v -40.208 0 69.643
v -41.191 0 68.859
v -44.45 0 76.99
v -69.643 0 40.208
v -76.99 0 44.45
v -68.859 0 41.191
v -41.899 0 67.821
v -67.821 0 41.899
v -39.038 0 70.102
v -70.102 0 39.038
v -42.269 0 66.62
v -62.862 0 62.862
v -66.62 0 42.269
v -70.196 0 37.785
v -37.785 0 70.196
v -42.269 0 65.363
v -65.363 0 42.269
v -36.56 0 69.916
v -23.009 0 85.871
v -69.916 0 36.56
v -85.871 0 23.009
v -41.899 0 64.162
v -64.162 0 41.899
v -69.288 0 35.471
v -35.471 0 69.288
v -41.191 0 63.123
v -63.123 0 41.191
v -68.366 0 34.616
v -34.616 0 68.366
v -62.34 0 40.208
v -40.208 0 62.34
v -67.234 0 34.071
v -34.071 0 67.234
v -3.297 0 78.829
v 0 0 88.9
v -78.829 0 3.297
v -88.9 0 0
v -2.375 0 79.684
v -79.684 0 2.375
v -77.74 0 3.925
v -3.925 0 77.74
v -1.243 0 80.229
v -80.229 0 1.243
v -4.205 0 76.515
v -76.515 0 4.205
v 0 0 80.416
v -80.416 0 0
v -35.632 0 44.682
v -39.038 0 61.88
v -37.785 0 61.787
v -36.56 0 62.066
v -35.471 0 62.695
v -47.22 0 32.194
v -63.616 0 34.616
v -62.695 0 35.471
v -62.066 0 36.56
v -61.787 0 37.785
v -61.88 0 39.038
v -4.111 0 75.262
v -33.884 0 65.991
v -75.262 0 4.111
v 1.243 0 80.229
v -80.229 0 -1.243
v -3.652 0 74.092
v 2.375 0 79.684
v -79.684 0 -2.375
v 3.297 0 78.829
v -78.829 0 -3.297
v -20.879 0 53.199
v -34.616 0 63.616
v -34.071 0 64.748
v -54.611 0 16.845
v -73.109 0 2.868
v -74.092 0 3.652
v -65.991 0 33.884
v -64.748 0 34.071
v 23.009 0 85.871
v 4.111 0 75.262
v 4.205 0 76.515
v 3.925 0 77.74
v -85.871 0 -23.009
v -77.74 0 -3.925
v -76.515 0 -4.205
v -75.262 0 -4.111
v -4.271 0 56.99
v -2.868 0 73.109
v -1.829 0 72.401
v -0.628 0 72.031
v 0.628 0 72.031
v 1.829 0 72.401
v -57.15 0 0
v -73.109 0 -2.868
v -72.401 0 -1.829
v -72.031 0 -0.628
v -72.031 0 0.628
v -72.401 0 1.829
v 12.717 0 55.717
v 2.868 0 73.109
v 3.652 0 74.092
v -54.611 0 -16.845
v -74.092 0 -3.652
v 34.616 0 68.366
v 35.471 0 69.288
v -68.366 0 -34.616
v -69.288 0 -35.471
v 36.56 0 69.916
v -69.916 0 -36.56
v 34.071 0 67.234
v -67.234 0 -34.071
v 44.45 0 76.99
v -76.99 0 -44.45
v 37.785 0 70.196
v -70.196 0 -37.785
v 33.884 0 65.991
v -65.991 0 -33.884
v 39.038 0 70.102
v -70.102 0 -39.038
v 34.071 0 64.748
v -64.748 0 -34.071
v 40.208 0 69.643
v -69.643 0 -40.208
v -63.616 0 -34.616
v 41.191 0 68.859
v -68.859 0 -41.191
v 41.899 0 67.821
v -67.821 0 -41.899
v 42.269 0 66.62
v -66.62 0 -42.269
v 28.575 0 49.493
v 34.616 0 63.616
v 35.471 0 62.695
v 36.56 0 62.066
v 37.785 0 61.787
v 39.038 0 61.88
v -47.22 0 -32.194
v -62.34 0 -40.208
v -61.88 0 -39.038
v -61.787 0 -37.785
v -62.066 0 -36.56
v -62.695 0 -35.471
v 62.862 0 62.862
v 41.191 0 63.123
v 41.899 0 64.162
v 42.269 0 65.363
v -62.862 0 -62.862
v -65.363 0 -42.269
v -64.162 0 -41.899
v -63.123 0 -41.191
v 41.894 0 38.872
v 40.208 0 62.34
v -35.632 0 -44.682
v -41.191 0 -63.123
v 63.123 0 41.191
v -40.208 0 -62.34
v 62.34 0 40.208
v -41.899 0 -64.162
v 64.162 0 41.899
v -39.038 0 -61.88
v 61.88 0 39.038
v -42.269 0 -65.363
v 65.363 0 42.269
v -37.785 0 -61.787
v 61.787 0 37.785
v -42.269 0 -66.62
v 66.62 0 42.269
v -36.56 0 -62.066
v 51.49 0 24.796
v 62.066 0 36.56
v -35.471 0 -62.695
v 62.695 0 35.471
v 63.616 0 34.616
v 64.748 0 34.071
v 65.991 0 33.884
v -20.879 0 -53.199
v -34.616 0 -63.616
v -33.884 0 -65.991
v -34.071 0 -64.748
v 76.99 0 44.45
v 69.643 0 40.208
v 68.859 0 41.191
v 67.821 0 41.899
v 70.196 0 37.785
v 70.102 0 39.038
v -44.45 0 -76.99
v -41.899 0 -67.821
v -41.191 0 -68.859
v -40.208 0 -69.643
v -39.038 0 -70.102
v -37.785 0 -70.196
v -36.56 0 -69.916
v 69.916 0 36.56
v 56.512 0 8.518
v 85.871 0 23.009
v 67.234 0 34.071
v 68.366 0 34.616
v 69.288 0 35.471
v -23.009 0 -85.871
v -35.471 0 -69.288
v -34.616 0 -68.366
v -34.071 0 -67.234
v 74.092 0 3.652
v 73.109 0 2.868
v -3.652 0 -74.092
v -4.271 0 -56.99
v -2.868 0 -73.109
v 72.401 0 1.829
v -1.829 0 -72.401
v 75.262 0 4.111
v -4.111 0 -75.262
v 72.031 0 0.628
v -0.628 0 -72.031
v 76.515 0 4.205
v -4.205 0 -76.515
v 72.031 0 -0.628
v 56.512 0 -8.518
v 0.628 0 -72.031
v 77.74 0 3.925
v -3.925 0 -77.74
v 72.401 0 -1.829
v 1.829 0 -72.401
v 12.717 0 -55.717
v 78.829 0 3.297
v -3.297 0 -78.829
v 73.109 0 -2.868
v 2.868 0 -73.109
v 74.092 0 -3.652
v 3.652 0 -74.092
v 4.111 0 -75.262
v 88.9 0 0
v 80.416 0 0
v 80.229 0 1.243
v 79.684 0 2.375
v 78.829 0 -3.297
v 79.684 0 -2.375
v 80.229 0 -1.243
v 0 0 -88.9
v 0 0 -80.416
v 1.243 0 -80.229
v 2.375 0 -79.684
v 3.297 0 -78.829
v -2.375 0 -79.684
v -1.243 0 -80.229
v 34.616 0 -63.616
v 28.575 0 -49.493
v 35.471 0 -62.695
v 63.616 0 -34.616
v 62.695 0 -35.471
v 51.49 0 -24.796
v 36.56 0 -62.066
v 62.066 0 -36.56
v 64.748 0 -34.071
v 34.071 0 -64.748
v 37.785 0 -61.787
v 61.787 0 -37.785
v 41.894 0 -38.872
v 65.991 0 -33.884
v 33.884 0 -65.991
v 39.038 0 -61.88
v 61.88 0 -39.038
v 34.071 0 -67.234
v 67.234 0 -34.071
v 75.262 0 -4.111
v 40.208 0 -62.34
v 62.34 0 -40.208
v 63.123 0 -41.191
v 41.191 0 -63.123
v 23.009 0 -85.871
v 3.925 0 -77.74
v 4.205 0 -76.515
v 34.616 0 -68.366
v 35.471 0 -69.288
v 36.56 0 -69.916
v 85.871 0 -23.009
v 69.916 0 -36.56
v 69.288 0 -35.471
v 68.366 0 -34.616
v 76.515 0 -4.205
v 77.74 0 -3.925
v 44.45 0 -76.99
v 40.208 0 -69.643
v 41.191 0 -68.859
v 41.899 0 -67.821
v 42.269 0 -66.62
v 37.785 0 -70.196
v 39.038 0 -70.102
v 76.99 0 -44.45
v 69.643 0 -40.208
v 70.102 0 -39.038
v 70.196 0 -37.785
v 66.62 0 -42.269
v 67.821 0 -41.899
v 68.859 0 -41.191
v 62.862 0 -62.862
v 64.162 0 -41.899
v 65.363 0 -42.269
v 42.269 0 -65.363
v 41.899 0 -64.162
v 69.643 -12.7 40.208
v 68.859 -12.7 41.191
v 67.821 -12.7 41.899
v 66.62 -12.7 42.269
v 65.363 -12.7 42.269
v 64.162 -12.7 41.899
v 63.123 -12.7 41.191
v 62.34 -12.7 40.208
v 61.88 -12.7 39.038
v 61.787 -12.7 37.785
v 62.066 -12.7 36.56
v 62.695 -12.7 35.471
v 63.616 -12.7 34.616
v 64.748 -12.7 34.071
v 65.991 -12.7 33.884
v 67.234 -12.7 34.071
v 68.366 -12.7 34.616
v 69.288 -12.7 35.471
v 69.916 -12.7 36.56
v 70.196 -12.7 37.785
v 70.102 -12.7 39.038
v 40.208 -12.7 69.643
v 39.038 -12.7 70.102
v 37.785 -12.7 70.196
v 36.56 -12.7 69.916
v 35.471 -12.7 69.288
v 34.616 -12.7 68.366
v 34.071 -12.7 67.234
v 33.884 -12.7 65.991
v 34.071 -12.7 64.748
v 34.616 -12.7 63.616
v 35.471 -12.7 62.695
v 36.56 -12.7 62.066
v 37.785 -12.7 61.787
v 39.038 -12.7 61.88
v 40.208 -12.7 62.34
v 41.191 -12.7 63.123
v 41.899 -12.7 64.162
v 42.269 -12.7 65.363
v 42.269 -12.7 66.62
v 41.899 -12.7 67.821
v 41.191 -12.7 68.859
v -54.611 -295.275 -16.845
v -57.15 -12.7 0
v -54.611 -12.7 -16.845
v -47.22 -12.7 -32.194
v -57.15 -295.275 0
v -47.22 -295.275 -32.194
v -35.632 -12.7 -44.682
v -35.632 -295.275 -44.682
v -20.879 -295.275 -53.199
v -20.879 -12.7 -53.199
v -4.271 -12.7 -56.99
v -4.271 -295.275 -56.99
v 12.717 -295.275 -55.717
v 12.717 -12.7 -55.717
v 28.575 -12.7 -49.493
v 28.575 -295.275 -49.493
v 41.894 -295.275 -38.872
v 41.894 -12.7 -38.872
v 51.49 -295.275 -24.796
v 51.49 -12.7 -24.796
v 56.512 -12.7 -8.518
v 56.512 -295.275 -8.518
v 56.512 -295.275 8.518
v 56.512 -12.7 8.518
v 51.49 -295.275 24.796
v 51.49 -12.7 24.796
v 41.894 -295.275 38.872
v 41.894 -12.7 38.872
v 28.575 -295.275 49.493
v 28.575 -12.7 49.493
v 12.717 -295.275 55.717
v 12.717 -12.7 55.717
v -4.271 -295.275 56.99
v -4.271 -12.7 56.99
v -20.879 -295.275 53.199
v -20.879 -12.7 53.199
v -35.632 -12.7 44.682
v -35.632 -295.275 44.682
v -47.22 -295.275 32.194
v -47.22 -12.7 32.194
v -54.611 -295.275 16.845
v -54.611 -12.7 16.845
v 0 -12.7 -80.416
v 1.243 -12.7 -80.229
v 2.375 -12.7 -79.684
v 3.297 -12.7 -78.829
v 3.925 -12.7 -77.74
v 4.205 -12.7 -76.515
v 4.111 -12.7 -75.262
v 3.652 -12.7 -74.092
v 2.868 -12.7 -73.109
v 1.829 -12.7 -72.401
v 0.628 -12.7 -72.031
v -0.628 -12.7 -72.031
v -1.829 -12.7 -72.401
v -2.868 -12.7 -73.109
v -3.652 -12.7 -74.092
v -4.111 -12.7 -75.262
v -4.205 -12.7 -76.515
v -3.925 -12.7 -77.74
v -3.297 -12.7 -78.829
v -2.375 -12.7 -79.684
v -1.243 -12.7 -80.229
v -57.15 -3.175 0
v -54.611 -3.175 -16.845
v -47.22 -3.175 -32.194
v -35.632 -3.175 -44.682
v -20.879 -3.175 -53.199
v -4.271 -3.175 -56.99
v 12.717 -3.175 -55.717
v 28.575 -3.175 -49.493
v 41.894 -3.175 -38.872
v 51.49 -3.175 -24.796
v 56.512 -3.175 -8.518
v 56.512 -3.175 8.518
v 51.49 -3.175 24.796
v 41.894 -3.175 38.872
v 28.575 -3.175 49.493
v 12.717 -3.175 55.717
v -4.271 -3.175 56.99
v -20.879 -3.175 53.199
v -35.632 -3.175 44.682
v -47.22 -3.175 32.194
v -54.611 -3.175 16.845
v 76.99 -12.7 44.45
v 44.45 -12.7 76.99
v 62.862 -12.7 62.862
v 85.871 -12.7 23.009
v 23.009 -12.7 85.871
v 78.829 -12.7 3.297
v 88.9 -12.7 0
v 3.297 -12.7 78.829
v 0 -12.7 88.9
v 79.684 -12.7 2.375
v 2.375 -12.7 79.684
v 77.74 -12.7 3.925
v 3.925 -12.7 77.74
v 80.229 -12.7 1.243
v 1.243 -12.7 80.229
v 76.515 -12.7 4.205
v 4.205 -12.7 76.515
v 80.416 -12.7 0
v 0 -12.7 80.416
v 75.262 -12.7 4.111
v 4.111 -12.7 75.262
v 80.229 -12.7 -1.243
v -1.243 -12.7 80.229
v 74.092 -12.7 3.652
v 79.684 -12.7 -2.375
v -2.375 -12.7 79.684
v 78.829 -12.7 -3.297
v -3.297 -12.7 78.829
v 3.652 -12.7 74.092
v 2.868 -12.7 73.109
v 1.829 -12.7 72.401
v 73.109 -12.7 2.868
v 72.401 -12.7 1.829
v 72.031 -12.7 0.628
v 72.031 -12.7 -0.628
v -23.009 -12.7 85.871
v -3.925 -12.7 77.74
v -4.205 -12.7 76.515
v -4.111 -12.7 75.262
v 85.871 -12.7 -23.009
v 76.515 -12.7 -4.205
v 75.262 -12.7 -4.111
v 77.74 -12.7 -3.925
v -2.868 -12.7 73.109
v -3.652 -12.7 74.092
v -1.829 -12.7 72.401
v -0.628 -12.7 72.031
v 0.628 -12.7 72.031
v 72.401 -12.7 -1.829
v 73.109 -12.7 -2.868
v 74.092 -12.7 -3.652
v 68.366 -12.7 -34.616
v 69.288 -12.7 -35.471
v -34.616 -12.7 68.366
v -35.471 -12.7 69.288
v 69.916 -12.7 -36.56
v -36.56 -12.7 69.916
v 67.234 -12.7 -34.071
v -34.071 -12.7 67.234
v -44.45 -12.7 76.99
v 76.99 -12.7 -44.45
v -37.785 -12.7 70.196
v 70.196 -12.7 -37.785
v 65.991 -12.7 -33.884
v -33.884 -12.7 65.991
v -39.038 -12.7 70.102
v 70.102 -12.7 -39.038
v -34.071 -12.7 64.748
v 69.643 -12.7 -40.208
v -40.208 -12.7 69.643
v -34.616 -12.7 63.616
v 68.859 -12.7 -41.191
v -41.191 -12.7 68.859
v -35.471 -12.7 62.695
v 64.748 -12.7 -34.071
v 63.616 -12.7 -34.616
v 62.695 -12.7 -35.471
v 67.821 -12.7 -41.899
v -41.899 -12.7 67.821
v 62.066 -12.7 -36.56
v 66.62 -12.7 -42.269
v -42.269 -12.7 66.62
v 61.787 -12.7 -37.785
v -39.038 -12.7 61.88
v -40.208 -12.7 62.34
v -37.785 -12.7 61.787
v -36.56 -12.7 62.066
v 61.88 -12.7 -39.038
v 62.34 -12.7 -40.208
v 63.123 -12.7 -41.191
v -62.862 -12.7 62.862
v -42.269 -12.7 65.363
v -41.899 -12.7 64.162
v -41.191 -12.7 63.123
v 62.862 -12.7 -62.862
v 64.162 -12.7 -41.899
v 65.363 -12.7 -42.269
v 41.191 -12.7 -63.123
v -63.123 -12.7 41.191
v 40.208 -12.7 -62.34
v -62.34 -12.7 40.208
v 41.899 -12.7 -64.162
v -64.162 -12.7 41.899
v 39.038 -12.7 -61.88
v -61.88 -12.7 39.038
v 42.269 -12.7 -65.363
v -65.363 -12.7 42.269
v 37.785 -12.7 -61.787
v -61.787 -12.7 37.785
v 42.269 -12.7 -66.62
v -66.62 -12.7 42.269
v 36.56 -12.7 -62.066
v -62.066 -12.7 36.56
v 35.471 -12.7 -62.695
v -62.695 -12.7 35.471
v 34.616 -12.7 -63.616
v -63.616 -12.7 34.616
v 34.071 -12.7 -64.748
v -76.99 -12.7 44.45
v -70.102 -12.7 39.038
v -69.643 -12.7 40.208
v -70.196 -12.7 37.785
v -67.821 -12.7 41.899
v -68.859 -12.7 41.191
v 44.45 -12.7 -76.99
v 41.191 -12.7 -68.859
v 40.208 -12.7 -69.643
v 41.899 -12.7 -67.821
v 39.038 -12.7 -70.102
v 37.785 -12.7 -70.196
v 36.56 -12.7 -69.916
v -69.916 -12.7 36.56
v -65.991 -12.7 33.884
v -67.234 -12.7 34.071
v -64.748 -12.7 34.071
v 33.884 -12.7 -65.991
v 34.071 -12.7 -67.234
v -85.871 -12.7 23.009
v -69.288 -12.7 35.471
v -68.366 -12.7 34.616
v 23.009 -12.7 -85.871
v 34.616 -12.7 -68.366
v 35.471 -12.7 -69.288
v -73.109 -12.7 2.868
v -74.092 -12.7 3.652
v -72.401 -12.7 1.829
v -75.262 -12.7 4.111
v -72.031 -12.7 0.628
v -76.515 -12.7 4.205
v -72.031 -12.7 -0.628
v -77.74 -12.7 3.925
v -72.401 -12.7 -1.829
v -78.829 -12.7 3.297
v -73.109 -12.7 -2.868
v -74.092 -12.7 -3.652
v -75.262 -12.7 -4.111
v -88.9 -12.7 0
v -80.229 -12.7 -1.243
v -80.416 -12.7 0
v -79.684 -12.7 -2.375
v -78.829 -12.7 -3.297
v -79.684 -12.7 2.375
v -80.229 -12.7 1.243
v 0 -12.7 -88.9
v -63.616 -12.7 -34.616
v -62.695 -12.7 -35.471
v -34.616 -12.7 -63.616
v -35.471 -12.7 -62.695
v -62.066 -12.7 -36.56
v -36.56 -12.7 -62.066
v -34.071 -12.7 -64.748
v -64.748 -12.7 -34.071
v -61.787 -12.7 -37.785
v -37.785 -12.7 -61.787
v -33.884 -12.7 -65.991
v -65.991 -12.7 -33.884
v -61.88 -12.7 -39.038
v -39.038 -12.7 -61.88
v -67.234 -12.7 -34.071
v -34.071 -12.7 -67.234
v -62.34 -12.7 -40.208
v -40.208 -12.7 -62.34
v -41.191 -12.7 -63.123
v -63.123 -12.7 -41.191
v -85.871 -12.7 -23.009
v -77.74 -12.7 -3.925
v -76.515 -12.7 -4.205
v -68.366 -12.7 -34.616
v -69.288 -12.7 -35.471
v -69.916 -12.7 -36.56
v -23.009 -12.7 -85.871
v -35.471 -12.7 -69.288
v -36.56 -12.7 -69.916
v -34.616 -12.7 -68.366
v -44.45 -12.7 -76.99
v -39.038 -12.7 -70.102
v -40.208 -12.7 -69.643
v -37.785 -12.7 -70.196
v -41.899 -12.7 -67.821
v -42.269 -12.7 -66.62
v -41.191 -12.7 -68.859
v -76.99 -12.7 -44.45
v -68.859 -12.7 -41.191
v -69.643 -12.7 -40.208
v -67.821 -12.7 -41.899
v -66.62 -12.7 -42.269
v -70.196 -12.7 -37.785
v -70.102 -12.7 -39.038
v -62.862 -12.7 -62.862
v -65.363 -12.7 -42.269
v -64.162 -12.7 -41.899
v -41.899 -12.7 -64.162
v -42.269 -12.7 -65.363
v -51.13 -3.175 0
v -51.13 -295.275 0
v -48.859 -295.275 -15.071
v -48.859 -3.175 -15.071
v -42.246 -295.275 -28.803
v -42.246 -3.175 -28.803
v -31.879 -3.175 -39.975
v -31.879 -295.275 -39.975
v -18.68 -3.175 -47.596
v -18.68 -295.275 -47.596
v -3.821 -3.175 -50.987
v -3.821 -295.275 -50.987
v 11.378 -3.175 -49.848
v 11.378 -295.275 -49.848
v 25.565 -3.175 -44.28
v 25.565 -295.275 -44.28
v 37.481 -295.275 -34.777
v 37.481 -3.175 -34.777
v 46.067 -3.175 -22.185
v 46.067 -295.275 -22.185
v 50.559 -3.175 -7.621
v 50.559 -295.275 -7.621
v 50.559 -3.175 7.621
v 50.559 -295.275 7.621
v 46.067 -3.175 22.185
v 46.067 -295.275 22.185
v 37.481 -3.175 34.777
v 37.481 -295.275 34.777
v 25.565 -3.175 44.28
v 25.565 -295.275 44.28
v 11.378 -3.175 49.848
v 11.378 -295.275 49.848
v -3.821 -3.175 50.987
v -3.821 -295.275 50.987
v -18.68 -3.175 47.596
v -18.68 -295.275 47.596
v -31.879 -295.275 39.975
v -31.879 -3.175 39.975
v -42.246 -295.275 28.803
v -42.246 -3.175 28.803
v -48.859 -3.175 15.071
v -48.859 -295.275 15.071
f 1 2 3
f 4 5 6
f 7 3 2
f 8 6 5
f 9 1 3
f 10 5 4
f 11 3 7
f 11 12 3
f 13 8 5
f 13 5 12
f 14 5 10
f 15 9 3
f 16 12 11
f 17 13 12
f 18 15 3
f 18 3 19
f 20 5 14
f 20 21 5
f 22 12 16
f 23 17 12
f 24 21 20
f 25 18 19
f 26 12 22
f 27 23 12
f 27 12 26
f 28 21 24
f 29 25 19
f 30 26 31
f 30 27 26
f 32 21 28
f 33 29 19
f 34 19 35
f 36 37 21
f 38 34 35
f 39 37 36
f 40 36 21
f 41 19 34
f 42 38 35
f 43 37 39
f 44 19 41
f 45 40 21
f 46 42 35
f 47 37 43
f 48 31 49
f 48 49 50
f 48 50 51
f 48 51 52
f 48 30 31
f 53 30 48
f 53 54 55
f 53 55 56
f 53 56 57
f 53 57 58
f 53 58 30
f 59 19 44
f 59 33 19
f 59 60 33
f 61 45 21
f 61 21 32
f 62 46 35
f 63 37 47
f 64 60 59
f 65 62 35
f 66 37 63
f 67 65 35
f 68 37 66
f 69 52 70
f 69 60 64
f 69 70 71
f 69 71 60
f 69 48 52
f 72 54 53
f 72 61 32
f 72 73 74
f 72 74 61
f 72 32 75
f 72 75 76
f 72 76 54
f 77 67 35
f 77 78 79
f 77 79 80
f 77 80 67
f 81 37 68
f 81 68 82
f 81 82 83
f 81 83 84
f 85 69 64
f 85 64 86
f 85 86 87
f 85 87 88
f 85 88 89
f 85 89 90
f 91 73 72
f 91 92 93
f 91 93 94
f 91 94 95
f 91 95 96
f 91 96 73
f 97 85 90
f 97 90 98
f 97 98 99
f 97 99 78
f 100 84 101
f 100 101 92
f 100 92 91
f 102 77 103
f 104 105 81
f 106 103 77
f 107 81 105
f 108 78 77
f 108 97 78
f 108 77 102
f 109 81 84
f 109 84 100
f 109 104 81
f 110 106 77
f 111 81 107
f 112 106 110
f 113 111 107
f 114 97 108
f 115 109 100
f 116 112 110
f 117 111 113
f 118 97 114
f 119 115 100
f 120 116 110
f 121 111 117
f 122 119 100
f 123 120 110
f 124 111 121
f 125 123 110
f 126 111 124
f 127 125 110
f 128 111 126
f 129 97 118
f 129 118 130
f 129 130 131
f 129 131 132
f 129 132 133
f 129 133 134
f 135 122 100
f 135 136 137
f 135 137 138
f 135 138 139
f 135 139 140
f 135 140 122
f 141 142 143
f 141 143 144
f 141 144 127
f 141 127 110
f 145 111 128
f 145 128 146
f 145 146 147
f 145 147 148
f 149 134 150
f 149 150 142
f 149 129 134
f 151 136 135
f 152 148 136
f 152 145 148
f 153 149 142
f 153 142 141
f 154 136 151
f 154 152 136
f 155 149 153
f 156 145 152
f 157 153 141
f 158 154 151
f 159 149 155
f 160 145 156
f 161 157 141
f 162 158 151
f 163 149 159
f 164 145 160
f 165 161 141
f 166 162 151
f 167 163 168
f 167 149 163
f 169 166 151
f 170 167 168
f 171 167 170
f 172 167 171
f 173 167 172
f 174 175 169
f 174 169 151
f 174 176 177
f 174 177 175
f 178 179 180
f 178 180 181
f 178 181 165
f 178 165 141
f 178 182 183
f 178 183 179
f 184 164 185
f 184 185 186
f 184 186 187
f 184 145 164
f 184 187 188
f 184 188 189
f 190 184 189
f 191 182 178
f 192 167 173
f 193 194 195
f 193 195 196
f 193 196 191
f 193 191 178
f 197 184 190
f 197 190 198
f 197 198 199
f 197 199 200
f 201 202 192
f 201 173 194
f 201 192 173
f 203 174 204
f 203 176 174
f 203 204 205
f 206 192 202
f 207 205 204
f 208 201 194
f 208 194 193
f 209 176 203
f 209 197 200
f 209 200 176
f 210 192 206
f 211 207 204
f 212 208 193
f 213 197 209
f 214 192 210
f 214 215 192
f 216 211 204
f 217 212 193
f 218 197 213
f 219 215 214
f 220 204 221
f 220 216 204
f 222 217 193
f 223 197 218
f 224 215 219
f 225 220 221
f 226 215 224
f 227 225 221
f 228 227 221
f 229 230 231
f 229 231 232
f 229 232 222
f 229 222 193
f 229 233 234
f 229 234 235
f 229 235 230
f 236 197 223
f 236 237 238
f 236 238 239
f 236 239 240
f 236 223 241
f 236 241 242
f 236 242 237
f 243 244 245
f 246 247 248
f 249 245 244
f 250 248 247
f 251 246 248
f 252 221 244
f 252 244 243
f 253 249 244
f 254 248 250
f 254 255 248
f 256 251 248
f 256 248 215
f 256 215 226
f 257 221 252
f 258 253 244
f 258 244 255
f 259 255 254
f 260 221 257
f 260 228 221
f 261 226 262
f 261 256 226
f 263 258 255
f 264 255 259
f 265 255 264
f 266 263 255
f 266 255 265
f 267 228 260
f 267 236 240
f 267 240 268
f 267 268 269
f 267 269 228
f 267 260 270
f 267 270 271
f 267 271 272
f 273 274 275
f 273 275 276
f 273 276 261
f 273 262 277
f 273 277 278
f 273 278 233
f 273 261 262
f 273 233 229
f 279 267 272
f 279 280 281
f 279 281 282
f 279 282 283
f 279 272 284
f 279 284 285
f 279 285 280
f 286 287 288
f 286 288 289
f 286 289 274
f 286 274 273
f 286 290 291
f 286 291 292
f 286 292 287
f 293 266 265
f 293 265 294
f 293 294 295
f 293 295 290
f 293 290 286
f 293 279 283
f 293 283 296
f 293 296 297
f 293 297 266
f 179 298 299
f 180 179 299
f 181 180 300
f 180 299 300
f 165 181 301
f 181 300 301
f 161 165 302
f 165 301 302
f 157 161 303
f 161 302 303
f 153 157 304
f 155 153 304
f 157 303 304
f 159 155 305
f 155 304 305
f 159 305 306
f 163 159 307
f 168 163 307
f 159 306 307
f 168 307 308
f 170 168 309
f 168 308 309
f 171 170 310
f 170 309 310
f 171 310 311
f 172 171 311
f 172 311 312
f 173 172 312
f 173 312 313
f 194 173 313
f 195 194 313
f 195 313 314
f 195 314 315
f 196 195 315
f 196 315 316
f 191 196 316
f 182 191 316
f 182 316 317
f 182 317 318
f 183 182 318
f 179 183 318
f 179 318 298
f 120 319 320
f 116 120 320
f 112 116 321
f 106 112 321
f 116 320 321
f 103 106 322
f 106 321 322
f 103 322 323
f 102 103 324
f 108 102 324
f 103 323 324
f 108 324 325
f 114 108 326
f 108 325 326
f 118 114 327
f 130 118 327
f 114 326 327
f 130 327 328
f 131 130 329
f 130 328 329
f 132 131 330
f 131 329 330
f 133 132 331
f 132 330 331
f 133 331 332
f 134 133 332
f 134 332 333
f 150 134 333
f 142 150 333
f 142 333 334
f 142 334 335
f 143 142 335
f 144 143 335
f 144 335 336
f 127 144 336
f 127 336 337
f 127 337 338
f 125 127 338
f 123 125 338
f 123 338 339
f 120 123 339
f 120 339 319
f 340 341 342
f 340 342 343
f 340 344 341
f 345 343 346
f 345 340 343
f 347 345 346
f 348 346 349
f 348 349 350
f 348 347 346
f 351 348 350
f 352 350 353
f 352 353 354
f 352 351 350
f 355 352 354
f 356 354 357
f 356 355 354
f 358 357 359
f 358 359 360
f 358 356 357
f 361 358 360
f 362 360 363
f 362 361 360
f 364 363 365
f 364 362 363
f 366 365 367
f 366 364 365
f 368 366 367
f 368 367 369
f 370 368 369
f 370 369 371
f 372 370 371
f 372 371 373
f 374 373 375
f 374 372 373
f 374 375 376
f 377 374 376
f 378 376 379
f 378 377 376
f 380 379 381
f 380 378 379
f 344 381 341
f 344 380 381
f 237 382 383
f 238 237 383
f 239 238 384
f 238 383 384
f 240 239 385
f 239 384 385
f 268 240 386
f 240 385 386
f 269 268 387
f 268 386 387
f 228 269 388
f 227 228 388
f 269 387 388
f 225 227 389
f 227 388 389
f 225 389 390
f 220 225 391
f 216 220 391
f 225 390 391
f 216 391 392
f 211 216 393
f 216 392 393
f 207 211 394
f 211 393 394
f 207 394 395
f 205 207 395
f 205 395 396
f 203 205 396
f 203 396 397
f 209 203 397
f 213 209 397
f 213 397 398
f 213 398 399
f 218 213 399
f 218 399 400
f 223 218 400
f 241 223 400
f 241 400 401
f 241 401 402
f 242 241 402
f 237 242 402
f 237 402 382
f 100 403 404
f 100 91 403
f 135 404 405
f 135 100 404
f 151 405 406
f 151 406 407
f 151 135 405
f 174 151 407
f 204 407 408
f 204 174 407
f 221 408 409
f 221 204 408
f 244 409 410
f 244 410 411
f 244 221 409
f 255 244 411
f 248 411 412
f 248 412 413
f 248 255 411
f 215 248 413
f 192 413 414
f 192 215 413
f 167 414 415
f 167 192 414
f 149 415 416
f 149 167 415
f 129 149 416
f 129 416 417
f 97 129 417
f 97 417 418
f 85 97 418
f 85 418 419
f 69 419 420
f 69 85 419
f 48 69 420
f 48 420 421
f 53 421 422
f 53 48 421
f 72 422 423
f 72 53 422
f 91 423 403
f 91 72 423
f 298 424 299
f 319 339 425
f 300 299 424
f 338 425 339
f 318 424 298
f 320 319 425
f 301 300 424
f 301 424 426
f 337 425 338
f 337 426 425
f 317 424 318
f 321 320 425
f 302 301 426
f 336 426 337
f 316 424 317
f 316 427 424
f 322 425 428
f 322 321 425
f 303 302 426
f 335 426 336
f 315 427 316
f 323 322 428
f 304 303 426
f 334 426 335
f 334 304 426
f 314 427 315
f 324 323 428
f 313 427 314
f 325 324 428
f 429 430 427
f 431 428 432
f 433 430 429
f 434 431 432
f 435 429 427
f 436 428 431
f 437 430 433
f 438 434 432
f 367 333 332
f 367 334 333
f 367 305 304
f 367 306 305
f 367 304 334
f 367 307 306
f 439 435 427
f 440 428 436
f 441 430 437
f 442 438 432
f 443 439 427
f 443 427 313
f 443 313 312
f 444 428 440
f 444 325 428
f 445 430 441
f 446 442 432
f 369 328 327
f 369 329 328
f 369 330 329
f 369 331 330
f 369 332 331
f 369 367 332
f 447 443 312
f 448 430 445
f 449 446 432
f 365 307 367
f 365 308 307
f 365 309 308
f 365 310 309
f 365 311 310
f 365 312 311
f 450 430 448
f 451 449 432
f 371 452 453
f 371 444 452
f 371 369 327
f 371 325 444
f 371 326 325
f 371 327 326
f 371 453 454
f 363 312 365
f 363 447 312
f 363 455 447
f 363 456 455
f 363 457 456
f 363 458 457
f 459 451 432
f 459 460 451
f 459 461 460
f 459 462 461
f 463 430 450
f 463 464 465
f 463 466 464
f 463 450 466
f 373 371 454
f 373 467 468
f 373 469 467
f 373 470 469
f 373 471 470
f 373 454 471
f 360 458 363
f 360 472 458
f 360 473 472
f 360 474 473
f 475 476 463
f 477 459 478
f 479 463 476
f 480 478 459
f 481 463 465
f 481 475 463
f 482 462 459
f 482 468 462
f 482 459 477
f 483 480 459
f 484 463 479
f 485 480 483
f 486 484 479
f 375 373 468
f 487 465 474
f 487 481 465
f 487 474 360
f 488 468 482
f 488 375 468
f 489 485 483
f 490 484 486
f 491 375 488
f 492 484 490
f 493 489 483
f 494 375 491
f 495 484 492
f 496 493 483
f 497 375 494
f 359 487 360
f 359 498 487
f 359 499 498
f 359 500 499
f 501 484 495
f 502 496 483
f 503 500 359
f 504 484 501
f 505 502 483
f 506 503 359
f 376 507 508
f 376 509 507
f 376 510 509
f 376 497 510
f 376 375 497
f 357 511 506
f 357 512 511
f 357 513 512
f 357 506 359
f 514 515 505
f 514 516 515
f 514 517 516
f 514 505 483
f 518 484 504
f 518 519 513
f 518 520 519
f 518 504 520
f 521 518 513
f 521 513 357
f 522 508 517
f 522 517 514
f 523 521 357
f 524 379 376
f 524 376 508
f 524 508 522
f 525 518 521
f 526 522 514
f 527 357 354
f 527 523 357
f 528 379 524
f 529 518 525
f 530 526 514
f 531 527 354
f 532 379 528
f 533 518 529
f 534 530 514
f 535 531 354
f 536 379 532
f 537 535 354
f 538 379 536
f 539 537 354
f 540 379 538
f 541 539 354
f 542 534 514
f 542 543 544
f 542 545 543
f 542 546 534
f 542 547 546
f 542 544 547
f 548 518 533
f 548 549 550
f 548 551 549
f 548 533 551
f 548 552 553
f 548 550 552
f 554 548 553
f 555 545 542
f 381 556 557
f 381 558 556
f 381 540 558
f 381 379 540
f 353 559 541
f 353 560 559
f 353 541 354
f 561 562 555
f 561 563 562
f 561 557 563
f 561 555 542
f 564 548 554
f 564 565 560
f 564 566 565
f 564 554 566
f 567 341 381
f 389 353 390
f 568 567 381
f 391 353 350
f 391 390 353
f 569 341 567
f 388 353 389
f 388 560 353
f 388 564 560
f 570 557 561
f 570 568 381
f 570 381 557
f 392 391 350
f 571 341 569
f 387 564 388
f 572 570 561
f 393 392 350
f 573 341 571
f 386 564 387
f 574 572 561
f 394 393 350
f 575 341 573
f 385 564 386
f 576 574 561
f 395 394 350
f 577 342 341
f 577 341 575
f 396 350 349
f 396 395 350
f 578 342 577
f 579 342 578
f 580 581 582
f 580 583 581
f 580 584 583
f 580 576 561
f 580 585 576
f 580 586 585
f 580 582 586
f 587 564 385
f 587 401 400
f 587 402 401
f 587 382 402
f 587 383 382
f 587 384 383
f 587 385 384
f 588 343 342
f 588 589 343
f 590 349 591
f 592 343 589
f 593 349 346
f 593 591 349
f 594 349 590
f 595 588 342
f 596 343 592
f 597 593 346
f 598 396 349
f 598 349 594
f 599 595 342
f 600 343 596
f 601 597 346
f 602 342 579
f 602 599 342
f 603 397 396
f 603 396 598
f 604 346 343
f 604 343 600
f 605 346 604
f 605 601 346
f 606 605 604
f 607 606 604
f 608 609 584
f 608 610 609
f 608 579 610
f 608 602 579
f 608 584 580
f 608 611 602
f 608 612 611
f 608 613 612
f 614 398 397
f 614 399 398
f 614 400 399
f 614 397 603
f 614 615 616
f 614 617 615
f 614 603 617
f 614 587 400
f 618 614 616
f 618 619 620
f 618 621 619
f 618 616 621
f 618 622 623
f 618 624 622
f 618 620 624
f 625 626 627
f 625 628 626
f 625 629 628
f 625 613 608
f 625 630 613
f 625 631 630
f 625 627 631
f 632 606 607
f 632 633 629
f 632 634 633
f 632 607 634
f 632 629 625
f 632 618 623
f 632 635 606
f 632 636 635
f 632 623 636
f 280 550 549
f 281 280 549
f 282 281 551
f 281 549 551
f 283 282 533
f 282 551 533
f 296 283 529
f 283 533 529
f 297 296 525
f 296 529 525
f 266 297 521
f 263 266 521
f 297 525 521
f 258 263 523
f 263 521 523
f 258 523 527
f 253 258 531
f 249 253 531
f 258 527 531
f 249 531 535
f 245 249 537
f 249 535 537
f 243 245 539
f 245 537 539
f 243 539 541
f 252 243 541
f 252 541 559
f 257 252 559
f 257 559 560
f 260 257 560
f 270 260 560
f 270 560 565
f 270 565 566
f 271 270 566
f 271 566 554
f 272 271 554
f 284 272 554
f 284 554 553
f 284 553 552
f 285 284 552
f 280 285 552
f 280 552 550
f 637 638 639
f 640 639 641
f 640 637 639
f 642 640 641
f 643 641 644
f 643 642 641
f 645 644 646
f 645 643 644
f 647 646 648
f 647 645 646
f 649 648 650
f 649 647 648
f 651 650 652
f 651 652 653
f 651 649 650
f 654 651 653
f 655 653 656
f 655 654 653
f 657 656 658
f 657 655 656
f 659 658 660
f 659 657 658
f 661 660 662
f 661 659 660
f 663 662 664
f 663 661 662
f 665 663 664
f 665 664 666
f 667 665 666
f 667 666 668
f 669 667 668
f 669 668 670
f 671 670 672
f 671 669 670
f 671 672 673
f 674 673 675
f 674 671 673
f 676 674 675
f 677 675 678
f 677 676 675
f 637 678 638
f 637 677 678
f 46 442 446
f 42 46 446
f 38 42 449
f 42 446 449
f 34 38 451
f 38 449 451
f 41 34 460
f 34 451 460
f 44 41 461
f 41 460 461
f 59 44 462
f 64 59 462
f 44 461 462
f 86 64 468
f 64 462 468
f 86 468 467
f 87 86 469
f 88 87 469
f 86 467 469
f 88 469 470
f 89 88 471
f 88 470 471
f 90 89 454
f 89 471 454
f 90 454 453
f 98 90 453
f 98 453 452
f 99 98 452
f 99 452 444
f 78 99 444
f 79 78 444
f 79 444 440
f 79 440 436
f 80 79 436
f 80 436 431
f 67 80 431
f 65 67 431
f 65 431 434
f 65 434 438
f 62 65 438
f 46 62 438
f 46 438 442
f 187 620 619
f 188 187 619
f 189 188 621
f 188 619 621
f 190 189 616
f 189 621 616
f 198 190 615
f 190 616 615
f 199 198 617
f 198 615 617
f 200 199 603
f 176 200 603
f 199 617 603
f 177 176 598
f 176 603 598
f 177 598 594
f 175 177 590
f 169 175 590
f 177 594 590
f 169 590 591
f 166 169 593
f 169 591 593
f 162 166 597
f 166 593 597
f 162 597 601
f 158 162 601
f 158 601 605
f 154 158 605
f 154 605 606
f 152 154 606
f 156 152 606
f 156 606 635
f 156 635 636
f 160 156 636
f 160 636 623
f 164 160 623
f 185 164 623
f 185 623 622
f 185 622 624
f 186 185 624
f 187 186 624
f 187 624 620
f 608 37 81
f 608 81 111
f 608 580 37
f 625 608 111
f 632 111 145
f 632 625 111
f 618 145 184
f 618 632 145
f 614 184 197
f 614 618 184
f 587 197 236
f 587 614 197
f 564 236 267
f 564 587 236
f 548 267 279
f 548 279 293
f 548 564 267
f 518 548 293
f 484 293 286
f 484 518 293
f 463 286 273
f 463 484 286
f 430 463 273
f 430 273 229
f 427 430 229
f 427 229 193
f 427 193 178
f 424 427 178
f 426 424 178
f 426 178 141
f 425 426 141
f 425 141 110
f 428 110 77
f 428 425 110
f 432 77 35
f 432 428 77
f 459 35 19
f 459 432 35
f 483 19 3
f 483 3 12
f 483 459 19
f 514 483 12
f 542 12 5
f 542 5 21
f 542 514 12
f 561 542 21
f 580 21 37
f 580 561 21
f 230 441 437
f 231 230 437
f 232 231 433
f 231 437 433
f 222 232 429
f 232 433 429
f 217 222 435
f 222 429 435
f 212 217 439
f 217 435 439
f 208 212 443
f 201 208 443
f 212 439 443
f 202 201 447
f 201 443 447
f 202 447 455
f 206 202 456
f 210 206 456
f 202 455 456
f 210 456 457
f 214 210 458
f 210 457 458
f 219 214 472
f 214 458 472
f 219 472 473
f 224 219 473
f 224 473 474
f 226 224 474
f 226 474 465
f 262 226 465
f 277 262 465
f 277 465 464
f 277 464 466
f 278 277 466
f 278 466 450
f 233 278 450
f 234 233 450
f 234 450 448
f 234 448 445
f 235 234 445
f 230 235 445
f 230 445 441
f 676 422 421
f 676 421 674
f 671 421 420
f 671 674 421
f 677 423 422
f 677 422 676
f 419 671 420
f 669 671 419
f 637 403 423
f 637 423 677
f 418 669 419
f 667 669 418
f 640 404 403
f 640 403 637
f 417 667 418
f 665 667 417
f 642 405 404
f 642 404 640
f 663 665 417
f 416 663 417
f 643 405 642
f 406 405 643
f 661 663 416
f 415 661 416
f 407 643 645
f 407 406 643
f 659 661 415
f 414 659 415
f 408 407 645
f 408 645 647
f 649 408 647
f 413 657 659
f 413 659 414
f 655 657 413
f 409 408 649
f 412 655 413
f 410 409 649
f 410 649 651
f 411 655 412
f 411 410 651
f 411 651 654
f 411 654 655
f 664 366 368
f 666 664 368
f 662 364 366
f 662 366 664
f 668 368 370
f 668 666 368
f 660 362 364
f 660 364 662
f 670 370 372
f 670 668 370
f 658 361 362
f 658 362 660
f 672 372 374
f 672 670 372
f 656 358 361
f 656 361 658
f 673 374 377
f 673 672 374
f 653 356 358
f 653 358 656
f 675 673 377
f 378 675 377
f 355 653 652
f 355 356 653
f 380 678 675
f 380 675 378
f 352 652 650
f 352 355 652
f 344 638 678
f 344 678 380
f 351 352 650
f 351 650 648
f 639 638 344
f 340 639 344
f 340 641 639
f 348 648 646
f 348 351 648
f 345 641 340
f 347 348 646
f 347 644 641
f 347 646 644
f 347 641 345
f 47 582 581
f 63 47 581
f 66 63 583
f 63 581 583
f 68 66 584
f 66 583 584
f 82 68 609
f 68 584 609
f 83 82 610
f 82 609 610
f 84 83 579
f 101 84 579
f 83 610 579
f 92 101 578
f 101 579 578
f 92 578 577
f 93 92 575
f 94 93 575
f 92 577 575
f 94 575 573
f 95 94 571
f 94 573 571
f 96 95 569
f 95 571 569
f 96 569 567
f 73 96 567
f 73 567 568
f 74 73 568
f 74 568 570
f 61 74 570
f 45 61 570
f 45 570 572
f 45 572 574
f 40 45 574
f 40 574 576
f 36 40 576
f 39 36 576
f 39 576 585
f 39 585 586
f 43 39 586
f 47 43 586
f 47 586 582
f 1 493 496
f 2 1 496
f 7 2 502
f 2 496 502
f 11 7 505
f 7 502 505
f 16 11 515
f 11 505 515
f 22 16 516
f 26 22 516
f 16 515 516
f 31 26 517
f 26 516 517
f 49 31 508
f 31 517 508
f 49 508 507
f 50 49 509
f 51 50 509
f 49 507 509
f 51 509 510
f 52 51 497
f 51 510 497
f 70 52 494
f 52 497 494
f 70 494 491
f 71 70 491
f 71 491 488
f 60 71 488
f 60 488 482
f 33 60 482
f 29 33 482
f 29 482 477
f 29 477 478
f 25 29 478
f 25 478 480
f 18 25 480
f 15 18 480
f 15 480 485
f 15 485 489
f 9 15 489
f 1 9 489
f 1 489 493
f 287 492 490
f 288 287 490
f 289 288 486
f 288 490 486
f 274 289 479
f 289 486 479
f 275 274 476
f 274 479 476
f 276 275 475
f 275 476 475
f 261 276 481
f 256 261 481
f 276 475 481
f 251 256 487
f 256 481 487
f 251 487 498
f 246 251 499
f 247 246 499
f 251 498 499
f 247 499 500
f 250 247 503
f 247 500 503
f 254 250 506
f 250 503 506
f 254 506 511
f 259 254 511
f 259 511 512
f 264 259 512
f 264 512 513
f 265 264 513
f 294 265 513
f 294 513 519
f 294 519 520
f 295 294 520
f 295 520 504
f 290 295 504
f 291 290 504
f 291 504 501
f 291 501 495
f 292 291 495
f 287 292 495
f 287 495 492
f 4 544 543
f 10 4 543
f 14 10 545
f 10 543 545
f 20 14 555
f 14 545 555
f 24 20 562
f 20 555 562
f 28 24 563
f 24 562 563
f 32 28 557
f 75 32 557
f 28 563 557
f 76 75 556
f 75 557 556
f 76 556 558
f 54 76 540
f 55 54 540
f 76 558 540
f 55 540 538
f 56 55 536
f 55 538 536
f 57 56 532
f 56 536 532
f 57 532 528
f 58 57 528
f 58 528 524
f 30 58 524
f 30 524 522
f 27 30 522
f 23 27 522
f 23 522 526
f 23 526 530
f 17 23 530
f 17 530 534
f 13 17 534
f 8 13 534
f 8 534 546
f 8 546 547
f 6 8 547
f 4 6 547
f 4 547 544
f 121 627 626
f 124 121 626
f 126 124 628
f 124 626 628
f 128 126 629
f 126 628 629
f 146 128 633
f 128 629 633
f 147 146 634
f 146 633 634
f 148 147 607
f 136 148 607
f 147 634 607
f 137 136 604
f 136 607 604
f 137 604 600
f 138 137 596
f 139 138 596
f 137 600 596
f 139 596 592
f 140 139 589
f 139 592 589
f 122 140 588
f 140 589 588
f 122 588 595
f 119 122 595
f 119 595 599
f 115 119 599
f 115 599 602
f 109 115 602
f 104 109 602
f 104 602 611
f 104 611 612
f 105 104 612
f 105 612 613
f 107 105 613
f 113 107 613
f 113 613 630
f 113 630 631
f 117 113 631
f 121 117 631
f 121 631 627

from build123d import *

# Parameters (mm, degrees)
F_5_16_CLEARANCE_HOLE1_D = 8.4328
CIRPATTERN1_COUNT        = 12


with BuildPart() as part:
    # Sketch1 → Revolve1 (revolve)
    with BuildSketch(Plane.XY):
        Polygon((-57.15, 0), (-88.9, 0), (-88.9, -12.7), (-57.15, -12.7), (-57.15, -295.275), (-51.1302, -295.275), (-51.1302, -3.175), (-57.15, -3.175), align=None)
    revolve(axis=Axis((0, 0, 0), (0, -1, 0)))

    # 5/16 Clearance Hole1 (through all)
    with Locations(Plane(origin=(0, 0, 0), x_dir=(1, 0, 0), z_dir=(0, 1, 0))):
        with Locations((-76.2, 0)):
            f_5_16_clearance_hole1 = Hole(F_5_16_CLEARANCE_HOLE1_D / 2)

    # CirPattern1: 5/16 Clearance Hole1 ×12 about axis
    cirpattern1_axis = Axis((0, 0, 0), (0, 1, 0))
    for i in range(1, CIRPATTERN1_COUNT):
        add(f_5_16_clearance_hole1.rotate(cirpattern1_axis, i * 360 / CIRPATTERN1_COUNT), mode=Mode.SUBTRACT)


solid = part.part
